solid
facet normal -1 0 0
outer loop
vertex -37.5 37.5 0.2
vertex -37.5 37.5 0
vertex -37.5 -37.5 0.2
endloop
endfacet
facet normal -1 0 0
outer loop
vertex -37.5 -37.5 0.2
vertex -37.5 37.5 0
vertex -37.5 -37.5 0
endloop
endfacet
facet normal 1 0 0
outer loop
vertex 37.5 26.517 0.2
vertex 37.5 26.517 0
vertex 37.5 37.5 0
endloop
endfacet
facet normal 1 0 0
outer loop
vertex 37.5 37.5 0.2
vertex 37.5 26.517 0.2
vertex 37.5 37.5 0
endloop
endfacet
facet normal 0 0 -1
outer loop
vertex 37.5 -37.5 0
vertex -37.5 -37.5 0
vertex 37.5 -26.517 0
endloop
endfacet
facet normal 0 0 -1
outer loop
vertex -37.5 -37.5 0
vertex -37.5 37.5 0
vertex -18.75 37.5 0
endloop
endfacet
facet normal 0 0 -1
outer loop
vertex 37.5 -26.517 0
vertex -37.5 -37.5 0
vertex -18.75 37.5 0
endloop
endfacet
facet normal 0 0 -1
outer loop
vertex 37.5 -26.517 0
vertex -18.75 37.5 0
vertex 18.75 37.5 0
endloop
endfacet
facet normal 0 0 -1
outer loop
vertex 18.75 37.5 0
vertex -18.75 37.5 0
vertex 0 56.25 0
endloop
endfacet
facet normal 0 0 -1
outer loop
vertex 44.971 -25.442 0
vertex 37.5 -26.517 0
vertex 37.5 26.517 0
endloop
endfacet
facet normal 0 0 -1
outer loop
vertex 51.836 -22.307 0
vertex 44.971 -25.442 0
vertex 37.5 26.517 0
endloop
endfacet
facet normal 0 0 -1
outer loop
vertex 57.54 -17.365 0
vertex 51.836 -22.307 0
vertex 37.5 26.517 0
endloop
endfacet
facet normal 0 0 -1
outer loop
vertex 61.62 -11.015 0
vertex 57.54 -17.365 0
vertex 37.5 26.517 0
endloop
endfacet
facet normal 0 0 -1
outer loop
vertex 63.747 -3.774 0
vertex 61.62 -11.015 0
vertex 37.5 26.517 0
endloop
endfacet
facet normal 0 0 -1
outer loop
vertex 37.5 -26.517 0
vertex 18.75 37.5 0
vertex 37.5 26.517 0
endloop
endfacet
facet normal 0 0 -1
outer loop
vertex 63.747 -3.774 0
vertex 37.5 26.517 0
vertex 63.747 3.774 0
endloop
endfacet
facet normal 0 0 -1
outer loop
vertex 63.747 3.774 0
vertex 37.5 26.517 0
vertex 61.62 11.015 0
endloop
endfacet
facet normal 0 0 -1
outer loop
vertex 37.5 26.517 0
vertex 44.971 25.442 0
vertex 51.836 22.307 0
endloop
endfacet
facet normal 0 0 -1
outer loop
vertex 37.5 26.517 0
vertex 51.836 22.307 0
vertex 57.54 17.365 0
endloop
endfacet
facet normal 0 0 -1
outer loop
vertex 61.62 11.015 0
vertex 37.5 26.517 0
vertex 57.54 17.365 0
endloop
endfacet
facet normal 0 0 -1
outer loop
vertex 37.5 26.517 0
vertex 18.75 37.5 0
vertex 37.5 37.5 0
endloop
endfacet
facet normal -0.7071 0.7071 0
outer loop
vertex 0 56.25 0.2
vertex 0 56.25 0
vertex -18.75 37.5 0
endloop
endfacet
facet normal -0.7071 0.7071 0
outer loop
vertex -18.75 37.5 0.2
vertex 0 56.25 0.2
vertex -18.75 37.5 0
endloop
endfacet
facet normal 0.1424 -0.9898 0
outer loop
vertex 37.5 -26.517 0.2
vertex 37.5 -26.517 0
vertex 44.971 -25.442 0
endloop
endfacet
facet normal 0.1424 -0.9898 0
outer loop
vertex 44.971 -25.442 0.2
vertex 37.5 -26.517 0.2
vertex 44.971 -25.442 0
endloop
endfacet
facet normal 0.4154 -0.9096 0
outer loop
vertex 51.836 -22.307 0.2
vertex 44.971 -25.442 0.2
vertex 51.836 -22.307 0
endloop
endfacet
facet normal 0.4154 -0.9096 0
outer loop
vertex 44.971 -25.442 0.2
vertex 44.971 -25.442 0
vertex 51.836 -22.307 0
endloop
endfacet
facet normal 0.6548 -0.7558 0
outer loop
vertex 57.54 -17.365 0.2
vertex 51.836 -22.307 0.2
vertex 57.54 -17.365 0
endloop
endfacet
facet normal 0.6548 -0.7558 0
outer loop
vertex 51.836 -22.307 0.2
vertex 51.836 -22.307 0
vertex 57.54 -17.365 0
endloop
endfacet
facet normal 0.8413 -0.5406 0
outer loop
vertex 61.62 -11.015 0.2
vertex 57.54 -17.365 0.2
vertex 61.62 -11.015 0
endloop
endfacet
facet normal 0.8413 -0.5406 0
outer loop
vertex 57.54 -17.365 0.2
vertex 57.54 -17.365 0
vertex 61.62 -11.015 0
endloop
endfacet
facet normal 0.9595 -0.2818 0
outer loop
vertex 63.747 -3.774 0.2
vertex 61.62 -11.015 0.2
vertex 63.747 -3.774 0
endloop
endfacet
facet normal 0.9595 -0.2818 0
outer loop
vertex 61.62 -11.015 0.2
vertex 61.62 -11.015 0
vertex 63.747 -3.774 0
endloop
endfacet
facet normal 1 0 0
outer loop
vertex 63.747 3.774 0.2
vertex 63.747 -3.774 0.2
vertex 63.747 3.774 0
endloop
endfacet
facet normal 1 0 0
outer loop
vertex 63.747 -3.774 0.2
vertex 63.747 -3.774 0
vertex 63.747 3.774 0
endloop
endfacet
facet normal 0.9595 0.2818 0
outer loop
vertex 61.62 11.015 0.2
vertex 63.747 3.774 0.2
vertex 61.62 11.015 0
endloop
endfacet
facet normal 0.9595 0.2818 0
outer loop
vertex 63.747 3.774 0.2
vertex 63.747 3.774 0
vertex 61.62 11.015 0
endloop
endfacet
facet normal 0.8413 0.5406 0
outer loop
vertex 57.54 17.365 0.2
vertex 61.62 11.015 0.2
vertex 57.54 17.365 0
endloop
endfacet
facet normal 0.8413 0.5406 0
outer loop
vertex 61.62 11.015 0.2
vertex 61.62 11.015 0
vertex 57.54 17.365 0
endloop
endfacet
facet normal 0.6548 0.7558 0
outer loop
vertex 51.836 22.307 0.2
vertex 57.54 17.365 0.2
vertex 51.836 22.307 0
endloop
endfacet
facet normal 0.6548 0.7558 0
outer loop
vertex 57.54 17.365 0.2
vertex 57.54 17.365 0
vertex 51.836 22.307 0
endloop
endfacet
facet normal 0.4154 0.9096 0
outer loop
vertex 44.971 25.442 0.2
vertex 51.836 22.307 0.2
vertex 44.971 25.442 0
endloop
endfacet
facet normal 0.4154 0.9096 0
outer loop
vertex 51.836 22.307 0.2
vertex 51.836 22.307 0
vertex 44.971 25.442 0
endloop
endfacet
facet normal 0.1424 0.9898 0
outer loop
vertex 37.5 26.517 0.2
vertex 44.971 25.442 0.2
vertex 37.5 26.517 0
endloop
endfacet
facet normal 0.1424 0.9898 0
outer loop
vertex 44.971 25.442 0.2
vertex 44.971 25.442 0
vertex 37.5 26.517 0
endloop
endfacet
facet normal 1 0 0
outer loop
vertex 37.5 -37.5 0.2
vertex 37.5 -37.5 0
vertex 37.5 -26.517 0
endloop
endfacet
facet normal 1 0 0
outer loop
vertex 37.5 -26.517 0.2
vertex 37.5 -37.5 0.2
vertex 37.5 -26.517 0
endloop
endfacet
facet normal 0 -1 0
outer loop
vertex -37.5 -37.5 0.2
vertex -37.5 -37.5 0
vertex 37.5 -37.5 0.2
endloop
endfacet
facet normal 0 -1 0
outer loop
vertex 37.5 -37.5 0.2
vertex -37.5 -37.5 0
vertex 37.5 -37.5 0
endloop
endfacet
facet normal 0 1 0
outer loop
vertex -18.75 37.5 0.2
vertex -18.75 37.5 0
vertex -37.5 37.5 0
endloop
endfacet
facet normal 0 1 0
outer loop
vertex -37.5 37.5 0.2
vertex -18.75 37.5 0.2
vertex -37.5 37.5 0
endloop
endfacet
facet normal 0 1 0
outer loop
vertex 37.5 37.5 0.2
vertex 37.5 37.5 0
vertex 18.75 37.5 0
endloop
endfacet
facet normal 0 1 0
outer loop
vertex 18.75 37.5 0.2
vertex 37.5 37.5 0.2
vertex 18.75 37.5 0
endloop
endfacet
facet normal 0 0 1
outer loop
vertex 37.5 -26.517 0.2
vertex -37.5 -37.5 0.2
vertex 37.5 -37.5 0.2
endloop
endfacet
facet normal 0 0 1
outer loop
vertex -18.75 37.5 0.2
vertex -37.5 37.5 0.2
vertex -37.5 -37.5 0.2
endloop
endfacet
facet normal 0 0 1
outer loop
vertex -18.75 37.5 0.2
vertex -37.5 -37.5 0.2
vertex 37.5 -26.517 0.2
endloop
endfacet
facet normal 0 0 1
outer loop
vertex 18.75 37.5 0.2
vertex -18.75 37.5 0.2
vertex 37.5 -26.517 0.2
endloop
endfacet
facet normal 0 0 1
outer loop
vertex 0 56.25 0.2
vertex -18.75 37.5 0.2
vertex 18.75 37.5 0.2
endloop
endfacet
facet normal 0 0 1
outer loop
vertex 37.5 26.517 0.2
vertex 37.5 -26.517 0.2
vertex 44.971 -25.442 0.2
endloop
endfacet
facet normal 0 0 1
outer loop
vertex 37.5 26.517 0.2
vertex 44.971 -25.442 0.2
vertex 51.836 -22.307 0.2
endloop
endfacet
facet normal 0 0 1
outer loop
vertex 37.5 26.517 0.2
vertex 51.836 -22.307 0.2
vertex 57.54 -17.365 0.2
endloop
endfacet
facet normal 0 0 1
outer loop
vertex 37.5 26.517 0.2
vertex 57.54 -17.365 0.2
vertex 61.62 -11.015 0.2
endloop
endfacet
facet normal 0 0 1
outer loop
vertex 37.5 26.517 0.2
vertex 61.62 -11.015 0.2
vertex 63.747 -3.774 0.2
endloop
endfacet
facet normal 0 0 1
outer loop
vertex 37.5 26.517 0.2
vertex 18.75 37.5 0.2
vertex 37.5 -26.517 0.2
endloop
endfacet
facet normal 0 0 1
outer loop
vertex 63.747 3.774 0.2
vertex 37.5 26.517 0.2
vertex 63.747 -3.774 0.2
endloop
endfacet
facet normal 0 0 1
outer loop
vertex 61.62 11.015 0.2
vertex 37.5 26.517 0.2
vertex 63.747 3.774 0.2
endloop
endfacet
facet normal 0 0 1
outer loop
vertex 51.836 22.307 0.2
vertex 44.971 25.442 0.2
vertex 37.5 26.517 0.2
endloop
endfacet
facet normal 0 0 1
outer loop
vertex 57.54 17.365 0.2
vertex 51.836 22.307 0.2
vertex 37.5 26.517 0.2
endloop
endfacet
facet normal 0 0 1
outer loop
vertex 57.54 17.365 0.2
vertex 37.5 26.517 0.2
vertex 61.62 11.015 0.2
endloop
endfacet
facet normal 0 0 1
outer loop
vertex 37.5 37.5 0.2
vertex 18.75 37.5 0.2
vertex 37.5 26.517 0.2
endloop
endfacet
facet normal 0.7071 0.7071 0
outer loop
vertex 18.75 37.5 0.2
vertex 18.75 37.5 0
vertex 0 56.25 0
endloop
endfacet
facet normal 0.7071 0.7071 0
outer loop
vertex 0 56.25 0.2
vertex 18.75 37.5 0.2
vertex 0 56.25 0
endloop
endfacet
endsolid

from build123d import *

# Parameters (mm, degrees)
F1_DEPTH = 0.2


with BuildPart() as f1:
    # F0 (on Top) → F1 (new body)
    with BuildSketch(Plane.XY):
        with BuildLine():
            Line((-18.75, 37.5), (-37.5, 37.5))
            Line((-37.5, 37.5), (-37.5, -37.5))
            Line((-37.5, -37.5), (37.5, -37.5))
            Line((37.5, -37.5), (37.5, -26.5165042945))
            ThreePointArc((37.5, -26.5165042945), (10.9834957055, 0), (37.5, 26.5165042945))
            Line((37.5, 26.5165042945), (37.5, 37.5))
            Line((37.5, 37.5), (18.75, 37.5))
            Line((18.75, 37.5), (-18.75, 37.5))
        make_face()
        Polygon((0, 56.25), (-18.75, 37.5), (18.75, 37.5), align=None)
        with BuildLine():
            ThreePointArc((37.5, 26.5165042945), (10.9834957055, 0), (37.5, -26.5165042945))
            Line((37.5, -26.5165042945), (37.5, 26.5165042945))
        make_face()
        with BuildLine():
            Line((37.5, 26.5165042945), (37.5, -26.5165042945))
            ThreePointArc((37.5, -26.5165042945), (56.25, -18.75), (64.0165042945, 0))
            ThreePointArc((64.0165042945, 0), (56.25, 18.75), (37.5, 26.5165042945))
        make_face()
    extrude(amount=F1_DEPTH)


solid = f1.part
